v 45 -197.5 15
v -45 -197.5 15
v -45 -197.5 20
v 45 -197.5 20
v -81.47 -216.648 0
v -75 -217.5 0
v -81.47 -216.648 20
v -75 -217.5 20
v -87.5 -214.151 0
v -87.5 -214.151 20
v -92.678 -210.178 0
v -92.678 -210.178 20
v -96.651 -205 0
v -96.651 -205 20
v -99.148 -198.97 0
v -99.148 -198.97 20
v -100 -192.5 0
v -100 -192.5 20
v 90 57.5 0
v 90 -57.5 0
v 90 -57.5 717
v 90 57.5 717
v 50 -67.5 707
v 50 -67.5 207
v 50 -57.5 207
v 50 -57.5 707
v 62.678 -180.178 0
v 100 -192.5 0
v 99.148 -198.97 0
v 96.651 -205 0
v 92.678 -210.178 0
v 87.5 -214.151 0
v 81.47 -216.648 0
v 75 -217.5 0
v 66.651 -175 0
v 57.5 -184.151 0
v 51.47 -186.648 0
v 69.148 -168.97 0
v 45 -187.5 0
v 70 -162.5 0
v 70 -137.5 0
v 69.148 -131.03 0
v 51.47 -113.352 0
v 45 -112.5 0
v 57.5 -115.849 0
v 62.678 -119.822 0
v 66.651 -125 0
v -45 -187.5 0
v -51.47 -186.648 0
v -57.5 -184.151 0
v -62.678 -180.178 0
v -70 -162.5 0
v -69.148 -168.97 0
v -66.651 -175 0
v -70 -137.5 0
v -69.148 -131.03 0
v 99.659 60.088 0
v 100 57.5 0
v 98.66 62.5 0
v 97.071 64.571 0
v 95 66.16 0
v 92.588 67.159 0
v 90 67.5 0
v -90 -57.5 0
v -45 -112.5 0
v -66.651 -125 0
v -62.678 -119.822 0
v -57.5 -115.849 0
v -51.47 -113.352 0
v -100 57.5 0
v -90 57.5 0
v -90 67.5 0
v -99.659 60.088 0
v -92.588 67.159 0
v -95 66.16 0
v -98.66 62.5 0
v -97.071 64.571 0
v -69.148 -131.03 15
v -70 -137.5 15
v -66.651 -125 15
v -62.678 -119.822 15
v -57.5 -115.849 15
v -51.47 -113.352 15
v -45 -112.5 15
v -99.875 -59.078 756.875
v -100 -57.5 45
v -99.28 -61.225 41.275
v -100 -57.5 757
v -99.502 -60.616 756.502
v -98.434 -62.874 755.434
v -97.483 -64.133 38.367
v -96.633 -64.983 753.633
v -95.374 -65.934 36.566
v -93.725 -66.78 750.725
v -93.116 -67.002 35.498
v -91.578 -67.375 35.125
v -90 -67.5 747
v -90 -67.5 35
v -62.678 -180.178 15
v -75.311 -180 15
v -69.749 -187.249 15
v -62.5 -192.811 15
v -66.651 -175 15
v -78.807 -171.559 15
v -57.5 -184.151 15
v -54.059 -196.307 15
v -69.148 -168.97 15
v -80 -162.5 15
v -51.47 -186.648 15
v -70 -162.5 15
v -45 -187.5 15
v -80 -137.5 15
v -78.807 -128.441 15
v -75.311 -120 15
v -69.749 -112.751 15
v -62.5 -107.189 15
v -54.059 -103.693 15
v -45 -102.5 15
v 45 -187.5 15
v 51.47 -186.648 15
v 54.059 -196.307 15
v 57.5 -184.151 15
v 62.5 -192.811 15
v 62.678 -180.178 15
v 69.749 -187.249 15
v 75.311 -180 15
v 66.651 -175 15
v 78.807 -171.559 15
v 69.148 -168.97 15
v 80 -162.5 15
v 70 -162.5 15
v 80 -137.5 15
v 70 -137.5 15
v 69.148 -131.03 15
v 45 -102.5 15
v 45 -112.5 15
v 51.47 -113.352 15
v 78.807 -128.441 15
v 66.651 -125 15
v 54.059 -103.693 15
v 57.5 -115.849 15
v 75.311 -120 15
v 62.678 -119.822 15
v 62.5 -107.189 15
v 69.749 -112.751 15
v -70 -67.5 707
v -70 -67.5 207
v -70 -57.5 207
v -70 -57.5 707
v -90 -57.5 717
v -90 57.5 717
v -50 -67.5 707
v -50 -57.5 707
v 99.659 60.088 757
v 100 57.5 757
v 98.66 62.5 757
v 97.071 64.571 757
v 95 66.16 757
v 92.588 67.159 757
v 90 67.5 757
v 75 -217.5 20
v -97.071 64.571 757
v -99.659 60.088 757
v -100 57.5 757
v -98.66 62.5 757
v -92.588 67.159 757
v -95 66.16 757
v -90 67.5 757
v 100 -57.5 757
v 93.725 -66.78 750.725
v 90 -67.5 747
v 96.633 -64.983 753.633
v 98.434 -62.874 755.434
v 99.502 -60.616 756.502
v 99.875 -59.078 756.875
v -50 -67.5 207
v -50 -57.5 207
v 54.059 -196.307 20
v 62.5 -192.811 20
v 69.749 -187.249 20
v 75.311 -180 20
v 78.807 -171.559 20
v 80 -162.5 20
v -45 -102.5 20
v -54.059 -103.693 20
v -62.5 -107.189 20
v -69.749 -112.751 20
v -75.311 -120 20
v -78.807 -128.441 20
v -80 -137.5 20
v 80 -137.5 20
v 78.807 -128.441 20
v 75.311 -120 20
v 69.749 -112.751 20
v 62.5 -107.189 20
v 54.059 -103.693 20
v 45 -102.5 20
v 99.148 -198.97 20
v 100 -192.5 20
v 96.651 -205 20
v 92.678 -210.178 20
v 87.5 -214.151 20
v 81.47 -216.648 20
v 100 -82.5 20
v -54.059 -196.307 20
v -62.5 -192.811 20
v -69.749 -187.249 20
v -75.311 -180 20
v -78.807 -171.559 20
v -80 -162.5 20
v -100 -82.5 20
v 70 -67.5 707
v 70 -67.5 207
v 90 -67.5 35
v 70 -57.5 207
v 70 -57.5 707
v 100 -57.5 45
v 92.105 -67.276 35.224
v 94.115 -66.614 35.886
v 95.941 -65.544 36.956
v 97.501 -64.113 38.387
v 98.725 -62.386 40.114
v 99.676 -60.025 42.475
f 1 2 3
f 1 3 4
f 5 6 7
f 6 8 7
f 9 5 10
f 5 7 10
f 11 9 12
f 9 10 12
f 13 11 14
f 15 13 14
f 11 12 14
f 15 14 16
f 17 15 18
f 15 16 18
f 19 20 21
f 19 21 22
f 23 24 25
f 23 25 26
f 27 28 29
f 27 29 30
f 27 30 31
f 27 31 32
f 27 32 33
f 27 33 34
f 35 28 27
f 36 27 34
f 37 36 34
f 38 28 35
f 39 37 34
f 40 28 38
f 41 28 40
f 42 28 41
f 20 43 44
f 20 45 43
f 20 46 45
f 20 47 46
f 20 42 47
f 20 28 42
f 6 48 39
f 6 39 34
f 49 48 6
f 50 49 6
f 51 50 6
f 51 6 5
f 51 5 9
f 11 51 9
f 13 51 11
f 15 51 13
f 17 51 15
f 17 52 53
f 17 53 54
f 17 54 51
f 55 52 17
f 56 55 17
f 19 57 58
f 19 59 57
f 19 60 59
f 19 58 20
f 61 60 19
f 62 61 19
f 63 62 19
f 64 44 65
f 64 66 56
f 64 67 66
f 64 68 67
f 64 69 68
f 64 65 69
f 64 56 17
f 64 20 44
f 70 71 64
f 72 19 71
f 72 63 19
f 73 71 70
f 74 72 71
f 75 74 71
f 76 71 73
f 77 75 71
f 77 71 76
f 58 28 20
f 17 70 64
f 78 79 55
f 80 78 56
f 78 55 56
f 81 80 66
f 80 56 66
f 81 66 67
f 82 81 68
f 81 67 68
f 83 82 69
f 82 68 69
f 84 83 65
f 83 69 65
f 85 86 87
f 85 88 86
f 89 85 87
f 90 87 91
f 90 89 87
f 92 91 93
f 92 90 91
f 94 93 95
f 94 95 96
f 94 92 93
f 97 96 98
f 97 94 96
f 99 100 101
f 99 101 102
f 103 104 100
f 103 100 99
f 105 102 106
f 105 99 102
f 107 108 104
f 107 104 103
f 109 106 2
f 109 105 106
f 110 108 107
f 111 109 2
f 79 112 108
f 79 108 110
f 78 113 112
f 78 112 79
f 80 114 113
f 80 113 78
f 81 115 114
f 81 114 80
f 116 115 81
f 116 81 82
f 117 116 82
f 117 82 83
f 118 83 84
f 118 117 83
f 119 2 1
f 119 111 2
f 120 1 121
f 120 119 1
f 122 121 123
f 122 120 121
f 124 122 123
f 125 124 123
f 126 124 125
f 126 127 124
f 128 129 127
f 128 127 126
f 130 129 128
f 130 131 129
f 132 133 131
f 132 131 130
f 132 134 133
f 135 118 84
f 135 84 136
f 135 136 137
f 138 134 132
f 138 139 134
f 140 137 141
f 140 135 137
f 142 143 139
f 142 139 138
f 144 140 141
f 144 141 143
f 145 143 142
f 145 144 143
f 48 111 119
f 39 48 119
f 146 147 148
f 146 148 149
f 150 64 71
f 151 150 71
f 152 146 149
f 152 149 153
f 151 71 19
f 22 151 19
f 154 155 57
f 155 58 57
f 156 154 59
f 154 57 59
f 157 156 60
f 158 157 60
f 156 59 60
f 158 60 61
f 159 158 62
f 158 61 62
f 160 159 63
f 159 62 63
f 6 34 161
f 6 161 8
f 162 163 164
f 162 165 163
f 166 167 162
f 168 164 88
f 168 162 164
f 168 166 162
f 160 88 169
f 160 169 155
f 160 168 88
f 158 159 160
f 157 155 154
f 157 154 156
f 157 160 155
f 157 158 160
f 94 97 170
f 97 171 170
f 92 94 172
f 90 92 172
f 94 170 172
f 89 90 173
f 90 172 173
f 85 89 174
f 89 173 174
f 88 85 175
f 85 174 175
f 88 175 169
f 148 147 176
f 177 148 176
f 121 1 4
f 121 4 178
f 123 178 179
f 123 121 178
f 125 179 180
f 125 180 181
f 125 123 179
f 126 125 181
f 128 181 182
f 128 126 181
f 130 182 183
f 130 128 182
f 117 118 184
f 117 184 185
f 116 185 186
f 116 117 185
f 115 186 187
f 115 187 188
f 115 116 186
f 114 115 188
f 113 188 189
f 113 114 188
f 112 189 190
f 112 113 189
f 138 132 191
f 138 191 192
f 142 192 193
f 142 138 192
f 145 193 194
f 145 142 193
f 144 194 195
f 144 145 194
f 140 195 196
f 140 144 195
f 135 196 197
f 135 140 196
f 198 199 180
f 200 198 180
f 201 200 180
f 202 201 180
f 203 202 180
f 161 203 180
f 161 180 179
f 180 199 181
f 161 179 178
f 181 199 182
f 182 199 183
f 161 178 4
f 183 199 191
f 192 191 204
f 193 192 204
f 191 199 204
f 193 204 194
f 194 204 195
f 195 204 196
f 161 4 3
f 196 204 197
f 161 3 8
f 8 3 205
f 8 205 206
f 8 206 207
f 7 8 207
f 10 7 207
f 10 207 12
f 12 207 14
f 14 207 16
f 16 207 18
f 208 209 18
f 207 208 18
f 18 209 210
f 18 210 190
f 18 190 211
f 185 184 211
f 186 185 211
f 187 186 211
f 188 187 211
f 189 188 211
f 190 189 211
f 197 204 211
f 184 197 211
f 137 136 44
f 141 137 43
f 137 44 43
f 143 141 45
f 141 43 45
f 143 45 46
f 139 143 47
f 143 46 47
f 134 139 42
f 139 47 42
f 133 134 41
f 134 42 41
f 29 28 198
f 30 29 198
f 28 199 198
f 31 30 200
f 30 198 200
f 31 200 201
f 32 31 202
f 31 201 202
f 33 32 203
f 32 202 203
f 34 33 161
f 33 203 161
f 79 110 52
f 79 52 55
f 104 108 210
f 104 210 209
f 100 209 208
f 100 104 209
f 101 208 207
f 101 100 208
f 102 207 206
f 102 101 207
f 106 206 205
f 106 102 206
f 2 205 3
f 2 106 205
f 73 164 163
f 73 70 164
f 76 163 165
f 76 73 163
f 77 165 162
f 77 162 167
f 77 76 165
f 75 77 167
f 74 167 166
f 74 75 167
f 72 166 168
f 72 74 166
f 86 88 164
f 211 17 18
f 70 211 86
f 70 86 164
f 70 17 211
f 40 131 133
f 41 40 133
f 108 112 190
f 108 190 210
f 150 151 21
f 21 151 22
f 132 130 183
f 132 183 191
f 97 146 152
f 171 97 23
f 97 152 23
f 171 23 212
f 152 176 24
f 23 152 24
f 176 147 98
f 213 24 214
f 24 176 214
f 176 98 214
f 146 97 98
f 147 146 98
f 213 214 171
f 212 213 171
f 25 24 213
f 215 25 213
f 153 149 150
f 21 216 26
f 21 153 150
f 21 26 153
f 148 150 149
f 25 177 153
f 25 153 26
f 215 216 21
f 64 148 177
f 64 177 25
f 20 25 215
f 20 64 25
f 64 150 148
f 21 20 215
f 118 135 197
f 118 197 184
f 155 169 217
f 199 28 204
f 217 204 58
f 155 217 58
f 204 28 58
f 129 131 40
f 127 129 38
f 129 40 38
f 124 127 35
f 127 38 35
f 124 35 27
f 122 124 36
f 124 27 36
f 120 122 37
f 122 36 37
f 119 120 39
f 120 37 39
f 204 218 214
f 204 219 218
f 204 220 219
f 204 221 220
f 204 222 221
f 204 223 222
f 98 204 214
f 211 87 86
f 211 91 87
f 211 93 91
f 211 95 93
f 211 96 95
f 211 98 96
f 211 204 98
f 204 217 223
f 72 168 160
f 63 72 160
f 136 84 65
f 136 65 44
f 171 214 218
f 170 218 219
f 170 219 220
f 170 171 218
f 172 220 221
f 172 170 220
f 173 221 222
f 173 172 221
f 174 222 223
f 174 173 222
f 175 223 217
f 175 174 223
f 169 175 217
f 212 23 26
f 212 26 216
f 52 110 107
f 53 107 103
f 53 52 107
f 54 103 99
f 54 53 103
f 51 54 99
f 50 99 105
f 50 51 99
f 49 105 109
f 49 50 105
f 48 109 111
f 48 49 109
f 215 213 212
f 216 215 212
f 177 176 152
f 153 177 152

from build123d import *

# Parameters (mm, degrees)
ESQUISSE1_W             = 200
ESQUISSE1_H             = 135
BOSS_EXTRU_1_DEPTH      = 727
COQUE1_T                = -10
ESQUISSE2_W             = 20
ESQUISSE2_H             = 500
ENL_V_MAT_EXTRU_1_DEPTH = 10
ESQUISSE3_W             = 200
ESQUISSE3_H             = 150
BOSS_EXTRU_2_DEPTH      = 20
CHANFREIN1_SIZE         = 15
ESQUISSE4_W             = 140
ESQUISSE4_H             = 75
ENL_V_MAT_EXTRU_2_DEPTH = 747.428328776
CONG_3_R                = 25
CONG_2_R                = 25
ENL_V_START             = -5
ENL_V_MAT_EXTRU_3_DEPTH = 5
ESQUISSE8_W             = 200
ESQUISSE8_H             = 135
BOSS_EXTRU_3_DEPTH      = 30
CONG_5_R                = 10


with BuildPart() as part:
    # Esquisse1 → Boss.-Extru.1 (new body)
    with BuildSketch(Plane.XY):
        Rectangle(ESQUISSE1_W, ESQUISSE1_H)
    extrude(amount=BOSS_EXTRU_1_DEPTH)

    # Coque1
    coque1_openings = [part.faces().sort_by_distance(p)[0] for p in [
        (0, 0, 0),
    ]]
    offset(amount=COQUE1_T, openings=coque1_openings, kind=Kind.INTERSECTION)

    # Esquisse2 → Enlèv. mat.-Extru.1 (cut)
    with BuildSketch(Plane.XZ.offset(67.5)):
        with Locations((-60, 457)):
            Rectangle(ESQUISSE2_W, ESQUISSE2_H)
        with Locations((60, 457)):
            Rectangle(ESQUISSE2_W, ESQUISSE2_H)
    extrude(amount=-ENL_V_MAT_EXTRU_1_DEPTH, mode=Mode.SUBTRACT)

    # Esquisse3 → Boss.-Extru.2 (add)
    with BuildSketch(Plane(origin=(0, 0, 0), x_dir=(-1, 0, 0), z_dir=(0, 0, -1))):
        with Locations((0, -142.5)):
            Rectangle(ESQUISSE3_W, ESQUISSE3_H)
    extrude(amount=-BOSS_EXTRU_2_DEPTH)

    # Chanfrein1
    chanfrein1_edges = [part.edges().sort_by_distance(p)[0] for p in [
        (0, -67.5, 20),
    ]]
    chamfer(chanfrein1_edges, length=CHANFREIN1_SIZE)

    # Esquisse4 → Enlèv. mat.-Extru.2 (cut, through all)
    with BuildSketch(Plane.XY.offset(20)):
        with Locations((0, -150)):
            Rectangle(ESQUISSE4_W, ESQUISSE4_H)
    extrude(amount=-ENL_V_MAT_EXTRU_2_DEPTH, mode=Mode.SUBTRACT)

    # Congé3
    cong_3_edges = [part.edges().sort_by_distance(p)[0] for p in [
        (70, -187.5, 10),
        (-70, -187.5, 10),
        (-70, -112.5, 10),
        (70, -112.5, 10),
    ]]
    fillet(cong_3_edges, radius=CONG_3_R)

    # Congé2
    cong_2_edges = [part.edges().sort_by_distance(p)[0] for p in [
        (-100, -217.5, 10),
        (100, -217.5, 10),
    ]]
    fillet(cong_2_edges, radius=CONG_2_R)

    # Esquisse5 → Enlèv. mat.-Extru.3 (cut)
    with BuildSketch(Plane.XY.offset(20).offset(ENL_V_START)):
        with BuildLine():
            Line((45, -102.5), (-45, -102.5))
            ThreePointArc((-45, -102.5), (-69.748737342, -112.751262658), (-80, -137.5))
            Line((-80, -137.5), (-80, -162.5))
            ThreePointArc((-80, -162.5), (-69.748737342, -187.248737342), (-45, -197.5))
            Line((-45, -197.5), (45, -197.5))
            ThreePointArc((45, -197.5), (69.748737342, -187.248737342), (80, -162.5))
            Line((80, -162.5), (80, -137.5))
            ThreePointArc((80, -137.5), (69.748737342, -112.751262658), (45, -102.5))
        make_face()
        with BuildLine():
            Line((70, -162.5), (70, -137.5))
            ThreePointArc((70, -137.5), (62.67766953, -119.82233047), (45, -112.5))
            Line((45, -112.5), (-45, -112.5))
            ThreePointArc((-45, -112.5), (-62.67766953, -119.82233047), (-70, -137.5))
            Line((-70, -137.5), (-70, -162.5))
            ThreePointArc((-70, -162.5), (-62.67766953, -180.17766953), (-45, -187.5))
            Line((-45, -187.5), (45, -187.5))
            ThreePointArc((45, -187.5), (62.67766953, -180.17766953), (70, -162.5))
        make_face(mode=Mode.SUBTRACT)
    extrude(amount=ENL_V_MAT_EXTRU_3_DEPTH, mode=Mode.SUBTRACT)

    # Esquisse8 → Boss.-Extru.3 (add)
    with BuildSketch(Plane.XY.offset(727)):
        Rectangle(ESQUISSE8_W, ESQUISSE8_H)
    extrude(amount=BOSS_EXTRU_3_DEPTH)

    # Congé5
    cong_5_edges = [part.edges().sort_by_distance(p)[0] for p in [
        (0, -67.5, 757),
        (100, -67.5, 396),
        (-100, -67.5, 396),
        (-100, 67.5, 378.5),
        (100, 67.5, 378.5),
    ]]
    fillet(cong_5_edges, radius=CONG_5_R)


solid = part.part
